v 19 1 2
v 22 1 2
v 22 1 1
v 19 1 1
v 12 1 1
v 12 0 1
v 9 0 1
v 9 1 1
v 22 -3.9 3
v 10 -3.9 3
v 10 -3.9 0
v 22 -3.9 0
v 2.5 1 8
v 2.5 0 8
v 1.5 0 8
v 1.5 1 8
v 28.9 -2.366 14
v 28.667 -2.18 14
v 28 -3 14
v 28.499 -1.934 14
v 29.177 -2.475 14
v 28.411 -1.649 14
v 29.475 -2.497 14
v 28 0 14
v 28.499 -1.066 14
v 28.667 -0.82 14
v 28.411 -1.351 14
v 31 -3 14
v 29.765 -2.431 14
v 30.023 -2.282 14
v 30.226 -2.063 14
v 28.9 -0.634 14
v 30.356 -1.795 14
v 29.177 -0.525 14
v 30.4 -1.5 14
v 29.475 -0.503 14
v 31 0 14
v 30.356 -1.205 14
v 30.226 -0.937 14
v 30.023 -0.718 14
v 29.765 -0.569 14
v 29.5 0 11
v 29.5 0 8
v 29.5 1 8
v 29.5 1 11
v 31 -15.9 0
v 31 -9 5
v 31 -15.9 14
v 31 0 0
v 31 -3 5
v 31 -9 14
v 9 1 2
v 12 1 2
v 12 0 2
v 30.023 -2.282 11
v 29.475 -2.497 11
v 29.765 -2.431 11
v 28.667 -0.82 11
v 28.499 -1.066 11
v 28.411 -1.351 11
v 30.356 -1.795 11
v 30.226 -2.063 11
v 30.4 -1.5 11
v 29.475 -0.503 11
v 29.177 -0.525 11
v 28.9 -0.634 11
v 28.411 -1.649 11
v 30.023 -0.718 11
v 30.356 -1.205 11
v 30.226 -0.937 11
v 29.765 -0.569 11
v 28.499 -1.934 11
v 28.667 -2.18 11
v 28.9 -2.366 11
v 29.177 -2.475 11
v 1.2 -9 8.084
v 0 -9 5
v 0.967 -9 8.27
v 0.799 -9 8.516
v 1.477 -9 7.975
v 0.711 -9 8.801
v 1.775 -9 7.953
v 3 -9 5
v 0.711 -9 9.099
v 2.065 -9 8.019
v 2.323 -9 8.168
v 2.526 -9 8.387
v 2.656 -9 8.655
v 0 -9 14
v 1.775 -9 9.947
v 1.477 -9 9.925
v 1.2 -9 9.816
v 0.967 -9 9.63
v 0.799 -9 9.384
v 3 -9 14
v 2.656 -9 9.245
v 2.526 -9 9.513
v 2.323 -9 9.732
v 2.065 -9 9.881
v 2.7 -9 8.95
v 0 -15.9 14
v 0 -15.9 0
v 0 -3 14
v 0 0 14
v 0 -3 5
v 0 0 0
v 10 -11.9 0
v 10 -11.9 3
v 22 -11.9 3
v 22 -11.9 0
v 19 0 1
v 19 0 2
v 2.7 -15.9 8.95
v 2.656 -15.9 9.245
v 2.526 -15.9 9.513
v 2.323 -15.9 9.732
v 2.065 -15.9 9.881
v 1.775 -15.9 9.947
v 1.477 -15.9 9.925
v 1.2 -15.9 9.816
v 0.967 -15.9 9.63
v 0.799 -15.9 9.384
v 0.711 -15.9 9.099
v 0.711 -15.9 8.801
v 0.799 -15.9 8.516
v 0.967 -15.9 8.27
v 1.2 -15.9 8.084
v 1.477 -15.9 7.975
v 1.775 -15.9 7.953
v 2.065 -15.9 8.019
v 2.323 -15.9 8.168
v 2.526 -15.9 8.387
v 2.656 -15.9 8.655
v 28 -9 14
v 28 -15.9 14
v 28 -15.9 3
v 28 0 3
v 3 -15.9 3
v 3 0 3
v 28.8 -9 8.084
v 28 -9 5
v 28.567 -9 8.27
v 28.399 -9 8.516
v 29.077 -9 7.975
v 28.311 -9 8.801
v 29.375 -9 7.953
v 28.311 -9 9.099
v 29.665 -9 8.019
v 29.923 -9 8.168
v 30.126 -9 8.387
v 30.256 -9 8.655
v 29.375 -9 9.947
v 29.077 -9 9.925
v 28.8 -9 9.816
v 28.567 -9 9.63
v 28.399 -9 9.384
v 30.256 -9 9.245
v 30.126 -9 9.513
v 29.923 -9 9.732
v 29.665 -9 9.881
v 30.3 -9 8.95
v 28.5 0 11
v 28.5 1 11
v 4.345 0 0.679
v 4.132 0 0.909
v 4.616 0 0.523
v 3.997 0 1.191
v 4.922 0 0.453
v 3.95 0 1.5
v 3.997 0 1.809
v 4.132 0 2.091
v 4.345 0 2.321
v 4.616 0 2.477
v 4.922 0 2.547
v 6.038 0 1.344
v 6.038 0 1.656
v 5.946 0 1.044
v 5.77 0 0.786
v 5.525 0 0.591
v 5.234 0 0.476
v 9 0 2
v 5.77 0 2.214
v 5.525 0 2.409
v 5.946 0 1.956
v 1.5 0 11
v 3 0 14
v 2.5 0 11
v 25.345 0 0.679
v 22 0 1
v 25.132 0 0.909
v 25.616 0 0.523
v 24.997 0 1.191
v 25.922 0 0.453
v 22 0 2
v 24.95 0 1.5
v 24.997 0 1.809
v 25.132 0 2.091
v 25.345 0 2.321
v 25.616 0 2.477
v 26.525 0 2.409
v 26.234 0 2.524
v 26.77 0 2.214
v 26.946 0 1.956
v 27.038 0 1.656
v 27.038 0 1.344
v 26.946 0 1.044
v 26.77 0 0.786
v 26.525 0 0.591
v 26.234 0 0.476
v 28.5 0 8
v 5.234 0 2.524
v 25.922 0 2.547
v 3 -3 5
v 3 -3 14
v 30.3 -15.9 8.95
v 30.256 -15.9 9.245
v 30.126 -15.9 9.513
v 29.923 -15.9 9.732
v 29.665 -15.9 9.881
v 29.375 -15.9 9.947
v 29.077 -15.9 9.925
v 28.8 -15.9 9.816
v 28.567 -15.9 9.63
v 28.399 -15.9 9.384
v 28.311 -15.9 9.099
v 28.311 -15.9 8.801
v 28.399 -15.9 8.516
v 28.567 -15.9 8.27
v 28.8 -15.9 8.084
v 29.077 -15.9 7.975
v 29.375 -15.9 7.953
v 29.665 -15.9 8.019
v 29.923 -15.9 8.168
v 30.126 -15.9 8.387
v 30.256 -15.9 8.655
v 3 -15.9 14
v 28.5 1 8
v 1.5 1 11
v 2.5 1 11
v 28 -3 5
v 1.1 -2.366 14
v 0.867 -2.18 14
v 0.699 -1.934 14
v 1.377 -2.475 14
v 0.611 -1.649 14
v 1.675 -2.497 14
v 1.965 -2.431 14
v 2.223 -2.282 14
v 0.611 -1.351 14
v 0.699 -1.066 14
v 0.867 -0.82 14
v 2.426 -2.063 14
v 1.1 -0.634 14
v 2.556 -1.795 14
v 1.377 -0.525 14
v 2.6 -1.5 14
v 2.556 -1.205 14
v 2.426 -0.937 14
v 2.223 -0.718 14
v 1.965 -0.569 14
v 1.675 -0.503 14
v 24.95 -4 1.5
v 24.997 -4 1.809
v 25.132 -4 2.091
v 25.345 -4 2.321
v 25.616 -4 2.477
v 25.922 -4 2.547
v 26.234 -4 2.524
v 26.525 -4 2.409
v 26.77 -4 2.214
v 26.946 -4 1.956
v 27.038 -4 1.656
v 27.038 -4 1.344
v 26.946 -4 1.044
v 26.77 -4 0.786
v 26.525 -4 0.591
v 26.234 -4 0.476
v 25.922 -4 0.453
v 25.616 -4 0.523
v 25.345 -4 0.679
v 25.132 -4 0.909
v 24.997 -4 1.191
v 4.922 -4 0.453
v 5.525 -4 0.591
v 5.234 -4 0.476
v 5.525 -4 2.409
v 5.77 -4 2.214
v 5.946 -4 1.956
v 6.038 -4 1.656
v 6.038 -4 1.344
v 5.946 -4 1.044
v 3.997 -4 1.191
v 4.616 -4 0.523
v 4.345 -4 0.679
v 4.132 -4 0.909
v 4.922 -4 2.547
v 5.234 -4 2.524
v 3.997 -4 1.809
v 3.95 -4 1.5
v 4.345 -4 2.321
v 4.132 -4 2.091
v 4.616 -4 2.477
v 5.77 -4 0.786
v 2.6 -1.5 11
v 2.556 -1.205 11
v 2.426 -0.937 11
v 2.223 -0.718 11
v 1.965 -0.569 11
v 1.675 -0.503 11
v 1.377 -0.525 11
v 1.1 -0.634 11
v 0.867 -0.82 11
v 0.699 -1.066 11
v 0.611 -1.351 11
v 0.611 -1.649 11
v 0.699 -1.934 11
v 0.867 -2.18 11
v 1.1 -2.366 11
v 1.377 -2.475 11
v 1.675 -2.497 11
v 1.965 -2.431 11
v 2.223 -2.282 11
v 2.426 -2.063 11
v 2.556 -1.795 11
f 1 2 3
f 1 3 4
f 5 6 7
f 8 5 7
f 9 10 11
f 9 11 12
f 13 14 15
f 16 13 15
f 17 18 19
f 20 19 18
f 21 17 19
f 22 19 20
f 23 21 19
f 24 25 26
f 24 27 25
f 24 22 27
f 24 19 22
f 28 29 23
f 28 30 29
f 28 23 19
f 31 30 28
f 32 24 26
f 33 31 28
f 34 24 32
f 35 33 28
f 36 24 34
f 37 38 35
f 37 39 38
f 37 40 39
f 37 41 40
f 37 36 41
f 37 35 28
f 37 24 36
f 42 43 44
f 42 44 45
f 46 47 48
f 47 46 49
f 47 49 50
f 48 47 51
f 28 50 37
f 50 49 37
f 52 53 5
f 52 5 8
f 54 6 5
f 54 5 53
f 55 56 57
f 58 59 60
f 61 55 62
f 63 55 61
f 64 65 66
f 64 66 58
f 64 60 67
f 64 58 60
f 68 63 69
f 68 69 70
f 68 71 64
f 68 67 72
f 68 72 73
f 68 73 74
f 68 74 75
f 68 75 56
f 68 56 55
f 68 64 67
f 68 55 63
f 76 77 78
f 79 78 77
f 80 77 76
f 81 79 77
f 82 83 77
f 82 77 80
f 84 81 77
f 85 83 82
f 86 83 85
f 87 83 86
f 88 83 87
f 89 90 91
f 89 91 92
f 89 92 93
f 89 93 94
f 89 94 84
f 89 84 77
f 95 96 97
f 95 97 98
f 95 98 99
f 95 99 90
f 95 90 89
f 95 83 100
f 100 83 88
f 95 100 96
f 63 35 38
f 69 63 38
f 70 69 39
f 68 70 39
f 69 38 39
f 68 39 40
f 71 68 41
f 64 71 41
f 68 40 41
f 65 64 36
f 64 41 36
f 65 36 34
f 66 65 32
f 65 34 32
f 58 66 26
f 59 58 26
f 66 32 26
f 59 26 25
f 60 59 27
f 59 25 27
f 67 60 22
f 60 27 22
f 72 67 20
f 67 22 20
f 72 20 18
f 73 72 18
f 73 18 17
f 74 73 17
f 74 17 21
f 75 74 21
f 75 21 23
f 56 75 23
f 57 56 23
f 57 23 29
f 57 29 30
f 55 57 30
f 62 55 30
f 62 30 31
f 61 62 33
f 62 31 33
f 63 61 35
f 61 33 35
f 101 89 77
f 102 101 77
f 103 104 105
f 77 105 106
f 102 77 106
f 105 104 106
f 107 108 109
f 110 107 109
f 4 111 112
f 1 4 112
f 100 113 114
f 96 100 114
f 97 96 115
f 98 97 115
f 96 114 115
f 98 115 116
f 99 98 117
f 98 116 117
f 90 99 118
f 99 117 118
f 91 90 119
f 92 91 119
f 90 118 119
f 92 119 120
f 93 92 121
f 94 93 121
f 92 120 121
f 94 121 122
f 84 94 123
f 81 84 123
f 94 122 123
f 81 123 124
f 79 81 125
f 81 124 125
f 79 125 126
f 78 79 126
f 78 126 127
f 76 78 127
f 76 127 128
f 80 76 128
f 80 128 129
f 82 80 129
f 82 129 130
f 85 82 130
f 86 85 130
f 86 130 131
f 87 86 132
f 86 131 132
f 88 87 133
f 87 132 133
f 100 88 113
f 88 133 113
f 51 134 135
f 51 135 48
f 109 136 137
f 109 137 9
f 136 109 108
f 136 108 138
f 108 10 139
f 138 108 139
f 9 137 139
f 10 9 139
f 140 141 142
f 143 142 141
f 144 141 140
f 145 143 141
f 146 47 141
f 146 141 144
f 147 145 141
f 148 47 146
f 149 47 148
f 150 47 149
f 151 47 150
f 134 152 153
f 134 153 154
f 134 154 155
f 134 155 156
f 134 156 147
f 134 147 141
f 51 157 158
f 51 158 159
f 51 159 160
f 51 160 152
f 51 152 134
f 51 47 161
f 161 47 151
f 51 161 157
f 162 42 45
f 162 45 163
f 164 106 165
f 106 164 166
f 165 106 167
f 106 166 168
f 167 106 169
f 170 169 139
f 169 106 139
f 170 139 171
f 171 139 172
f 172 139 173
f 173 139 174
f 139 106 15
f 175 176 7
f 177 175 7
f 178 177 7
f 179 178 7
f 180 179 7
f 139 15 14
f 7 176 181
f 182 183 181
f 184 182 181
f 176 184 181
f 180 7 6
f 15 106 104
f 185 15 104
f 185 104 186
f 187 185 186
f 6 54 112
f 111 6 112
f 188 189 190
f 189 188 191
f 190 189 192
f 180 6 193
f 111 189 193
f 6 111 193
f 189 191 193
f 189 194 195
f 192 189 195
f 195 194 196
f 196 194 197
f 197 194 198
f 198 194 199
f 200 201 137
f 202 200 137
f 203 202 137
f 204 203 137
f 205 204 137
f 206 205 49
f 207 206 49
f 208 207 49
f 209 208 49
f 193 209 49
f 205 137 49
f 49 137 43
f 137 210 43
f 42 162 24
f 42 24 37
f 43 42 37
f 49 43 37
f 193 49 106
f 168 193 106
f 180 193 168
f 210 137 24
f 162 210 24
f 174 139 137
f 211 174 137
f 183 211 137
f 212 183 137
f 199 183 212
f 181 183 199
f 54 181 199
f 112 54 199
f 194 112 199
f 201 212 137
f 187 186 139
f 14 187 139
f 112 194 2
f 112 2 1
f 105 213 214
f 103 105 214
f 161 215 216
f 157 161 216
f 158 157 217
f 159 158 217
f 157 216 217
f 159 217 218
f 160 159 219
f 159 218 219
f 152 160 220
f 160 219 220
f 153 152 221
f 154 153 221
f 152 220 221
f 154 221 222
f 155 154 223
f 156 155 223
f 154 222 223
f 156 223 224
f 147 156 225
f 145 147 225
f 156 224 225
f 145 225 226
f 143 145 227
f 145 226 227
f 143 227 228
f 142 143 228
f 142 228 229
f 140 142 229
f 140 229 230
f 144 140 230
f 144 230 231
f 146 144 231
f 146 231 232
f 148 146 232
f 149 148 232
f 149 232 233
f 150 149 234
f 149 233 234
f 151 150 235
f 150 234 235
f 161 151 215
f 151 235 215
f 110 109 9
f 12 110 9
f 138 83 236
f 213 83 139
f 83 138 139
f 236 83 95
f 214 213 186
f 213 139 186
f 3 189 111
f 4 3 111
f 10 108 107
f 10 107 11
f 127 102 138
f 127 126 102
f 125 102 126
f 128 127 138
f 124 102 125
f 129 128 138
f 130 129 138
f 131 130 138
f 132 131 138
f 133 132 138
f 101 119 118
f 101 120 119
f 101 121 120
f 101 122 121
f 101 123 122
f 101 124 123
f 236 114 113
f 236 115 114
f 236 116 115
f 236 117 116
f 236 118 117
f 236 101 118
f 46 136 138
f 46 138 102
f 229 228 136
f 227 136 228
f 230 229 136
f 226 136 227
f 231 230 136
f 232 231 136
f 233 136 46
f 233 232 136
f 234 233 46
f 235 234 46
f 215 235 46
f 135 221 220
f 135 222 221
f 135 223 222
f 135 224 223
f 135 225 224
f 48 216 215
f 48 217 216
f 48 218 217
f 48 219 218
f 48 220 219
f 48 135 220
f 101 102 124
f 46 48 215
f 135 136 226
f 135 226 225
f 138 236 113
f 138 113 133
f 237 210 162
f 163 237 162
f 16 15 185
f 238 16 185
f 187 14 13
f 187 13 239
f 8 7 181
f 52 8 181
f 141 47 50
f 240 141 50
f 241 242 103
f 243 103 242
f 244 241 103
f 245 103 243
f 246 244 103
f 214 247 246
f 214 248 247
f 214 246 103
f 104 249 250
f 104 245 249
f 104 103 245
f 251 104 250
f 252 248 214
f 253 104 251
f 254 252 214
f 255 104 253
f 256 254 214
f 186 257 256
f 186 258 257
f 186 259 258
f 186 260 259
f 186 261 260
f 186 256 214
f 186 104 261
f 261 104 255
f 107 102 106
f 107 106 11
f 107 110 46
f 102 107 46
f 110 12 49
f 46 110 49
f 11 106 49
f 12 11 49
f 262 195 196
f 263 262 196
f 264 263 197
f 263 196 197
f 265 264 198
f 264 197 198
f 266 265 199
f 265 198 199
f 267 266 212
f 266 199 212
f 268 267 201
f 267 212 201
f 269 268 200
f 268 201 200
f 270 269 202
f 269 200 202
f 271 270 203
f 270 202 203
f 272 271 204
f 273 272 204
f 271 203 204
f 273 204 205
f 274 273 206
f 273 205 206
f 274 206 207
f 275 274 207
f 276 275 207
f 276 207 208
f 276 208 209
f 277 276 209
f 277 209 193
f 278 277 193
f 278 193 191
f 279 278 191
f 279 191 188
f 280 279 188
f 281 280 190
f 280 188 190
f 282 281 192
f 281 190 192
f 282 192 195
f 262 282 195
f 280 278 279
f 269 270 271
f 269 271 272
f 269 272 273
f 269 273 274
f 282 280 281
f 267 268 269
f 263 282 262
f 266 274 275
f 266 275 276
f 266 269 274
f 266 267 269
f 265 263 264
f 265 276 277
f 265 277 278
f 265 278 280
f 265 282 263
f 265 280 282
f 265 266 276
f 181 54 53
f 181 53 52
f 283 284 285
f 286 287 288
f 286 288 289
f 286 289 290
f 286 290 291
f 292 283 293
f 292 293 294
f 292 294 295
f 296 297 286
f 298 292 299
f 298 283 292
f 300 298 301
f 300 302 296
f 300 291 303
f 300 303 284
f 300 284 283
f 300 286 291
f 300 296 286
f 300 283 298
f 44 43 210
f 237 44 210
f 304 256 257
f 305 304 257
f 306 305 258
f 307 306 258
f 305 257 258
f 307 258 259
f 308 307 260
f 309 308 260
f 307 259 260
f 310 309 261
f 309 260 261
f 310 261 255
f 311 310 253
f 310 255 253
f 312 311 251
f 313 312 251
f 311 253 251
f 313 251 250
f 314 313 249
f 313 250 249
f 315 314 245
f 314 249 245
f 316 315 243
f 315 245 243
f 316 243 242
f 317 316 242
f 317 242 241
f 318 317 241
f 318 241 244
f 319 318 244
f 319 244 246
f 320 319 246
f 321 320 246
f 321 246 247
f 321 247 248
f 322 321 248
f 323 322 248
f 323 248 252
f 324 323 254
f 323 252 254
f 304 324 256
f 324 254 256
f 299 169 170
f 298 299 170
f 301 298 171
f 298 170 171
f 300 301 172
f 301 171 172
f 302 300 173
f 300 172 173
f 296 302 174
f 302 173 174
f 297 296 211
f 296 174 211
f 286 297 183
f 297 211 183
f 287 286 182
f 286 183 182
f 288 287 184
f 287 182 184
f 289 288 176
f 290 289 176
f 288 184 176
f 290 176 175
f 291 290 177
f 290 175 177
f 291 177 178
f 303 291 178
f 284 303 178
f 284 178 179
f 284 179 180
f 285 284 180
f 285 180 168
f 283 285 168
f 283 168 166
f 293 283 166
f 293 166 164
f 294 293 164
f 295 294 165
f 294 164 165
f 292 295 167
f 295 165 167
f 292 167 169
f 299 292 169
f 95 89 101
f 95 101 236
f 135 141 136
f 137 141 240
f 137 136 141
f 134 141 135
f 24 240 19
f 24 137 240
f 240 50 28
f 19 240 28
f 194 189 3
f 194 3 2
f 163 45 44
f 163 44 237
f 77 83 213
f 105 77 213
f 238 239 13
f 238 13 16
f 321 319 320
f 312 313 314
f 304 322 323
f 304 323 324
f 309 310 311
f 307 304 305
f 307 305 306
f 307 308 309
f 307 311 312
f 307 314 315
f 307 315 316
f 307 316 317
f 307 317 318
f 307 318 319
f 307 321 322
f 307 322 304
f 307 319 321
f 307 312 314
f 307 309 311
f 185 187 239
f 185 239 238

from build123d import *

# Parameters (mm, degrees)
F0_W      = 3
F0_H      = 11
F1_DEPTH  = 15.9
F2_W      = 6
F2_H      = 9
F3_DEPTH  = 31.001
F4_R      = 1
F5_DEPTH  = 6.9
F6_R      = 1.05
F7_DEPTH  = 4
F8_W      = 3
F8_H      = 1
F8_W_2    = 1
F8_H_2    = 3
F9_DEPTH  = 1
F10_R     = 1
F11_DEPTH = 3
F12_W     = 12
F12_H     = 8
F13_DEPTH = 3


with BuildPart() as f1:
    # F0 (on Front) → F1 (new body)
    with BuildSketch(Plane.XZ):
        with Locations((1.5, 8.5)):
            Rectangle(F0_W, F0_H)
        Polygon((3, 3), (0, 3), (0, 0), (31, 0), (31, 3), (28, 3), align=None)
        with Locations((29.5, 8.5)):
            Rectangle(F0_W, F0_H)
    extrude(amount=F1_DEPTH)

    # F2 (on face) → F3 (cut, through all)
    with BuildSketch(Plane.YZ.offset(31)):
        with Locations((-6, 9.5)):
            Rectangle(F2_W, F2_H)
    extrude(amount=-F3_DEPTH, mode=Mode.SUBTRACT)

    # F4 (on face) → F5 (cut, through all)
    with BuildSketch(Plane.XZ.offset(15.9)):
        with Locations((1.7, 8.95)):
            Circle(F4_R)
        with Locations((29.3, 8.95)):
            Circle(F4_R)
    extrude(amount=-F5_DEPTH, mode=Mode.SUBTRACT)

    # F6 (on face) → F7 (cut)
    with BuildSketch(Plane(origin=(0, 0, 0), x_dir=(-1, 0, 0), z_dir=(0, 1, 0))):
        with Locations((-26, 1.5)):
            Circle(F6_R)
        with Locations((-5, 1.5)):
            Circle(F6_R)
    extrude(amount=-F7_DEPTH, mode=Mode.SUBTRACT)

    # F8 (on face) → F9 (join)
    with BuildSketch(Plane(origin=(0, 0, 0), x_dir=(-1, 0, 0), z_dir=(0, 1, 0))):
        with Locations((-20.5, 1.5)):
            Rectangle(F8_W, F8_H)
        with Locations((-10.5, 1.5)):
            Rectangle(F8_W, F8_H)
        with Locations((-29, 9.5)):
            Rectangle(F8_W_2, F8_H_2)
        with Locations((-2, 9.5)):
            Rectangle(F8_W_2, F8_H_2)
    extrude(amount=F9_DEPTH)

    # F10 (on face) → F11 (cut)
    with BuildSketch(Plane.XY.offset(14)):
        with Locations((29.4, -1.5)):
            Circle(F10_R)
        with Locations((1.6, -1.5)):
            Circle(F10_R)
    extrude(amount=-F11_DEPTH, mode=Mode.SUBTRACT)

    # F12 (on face) → F13 (cut, through all)
    with BuildSketch(Plane.XY.offset(3)):
        with Locations((16, -7.9)):
            Rectangle(F12_W, F12_H)
    extrude(amount=-F13_DEPTH, mode=Mode.SUBTRACT)


solid = f1.part
